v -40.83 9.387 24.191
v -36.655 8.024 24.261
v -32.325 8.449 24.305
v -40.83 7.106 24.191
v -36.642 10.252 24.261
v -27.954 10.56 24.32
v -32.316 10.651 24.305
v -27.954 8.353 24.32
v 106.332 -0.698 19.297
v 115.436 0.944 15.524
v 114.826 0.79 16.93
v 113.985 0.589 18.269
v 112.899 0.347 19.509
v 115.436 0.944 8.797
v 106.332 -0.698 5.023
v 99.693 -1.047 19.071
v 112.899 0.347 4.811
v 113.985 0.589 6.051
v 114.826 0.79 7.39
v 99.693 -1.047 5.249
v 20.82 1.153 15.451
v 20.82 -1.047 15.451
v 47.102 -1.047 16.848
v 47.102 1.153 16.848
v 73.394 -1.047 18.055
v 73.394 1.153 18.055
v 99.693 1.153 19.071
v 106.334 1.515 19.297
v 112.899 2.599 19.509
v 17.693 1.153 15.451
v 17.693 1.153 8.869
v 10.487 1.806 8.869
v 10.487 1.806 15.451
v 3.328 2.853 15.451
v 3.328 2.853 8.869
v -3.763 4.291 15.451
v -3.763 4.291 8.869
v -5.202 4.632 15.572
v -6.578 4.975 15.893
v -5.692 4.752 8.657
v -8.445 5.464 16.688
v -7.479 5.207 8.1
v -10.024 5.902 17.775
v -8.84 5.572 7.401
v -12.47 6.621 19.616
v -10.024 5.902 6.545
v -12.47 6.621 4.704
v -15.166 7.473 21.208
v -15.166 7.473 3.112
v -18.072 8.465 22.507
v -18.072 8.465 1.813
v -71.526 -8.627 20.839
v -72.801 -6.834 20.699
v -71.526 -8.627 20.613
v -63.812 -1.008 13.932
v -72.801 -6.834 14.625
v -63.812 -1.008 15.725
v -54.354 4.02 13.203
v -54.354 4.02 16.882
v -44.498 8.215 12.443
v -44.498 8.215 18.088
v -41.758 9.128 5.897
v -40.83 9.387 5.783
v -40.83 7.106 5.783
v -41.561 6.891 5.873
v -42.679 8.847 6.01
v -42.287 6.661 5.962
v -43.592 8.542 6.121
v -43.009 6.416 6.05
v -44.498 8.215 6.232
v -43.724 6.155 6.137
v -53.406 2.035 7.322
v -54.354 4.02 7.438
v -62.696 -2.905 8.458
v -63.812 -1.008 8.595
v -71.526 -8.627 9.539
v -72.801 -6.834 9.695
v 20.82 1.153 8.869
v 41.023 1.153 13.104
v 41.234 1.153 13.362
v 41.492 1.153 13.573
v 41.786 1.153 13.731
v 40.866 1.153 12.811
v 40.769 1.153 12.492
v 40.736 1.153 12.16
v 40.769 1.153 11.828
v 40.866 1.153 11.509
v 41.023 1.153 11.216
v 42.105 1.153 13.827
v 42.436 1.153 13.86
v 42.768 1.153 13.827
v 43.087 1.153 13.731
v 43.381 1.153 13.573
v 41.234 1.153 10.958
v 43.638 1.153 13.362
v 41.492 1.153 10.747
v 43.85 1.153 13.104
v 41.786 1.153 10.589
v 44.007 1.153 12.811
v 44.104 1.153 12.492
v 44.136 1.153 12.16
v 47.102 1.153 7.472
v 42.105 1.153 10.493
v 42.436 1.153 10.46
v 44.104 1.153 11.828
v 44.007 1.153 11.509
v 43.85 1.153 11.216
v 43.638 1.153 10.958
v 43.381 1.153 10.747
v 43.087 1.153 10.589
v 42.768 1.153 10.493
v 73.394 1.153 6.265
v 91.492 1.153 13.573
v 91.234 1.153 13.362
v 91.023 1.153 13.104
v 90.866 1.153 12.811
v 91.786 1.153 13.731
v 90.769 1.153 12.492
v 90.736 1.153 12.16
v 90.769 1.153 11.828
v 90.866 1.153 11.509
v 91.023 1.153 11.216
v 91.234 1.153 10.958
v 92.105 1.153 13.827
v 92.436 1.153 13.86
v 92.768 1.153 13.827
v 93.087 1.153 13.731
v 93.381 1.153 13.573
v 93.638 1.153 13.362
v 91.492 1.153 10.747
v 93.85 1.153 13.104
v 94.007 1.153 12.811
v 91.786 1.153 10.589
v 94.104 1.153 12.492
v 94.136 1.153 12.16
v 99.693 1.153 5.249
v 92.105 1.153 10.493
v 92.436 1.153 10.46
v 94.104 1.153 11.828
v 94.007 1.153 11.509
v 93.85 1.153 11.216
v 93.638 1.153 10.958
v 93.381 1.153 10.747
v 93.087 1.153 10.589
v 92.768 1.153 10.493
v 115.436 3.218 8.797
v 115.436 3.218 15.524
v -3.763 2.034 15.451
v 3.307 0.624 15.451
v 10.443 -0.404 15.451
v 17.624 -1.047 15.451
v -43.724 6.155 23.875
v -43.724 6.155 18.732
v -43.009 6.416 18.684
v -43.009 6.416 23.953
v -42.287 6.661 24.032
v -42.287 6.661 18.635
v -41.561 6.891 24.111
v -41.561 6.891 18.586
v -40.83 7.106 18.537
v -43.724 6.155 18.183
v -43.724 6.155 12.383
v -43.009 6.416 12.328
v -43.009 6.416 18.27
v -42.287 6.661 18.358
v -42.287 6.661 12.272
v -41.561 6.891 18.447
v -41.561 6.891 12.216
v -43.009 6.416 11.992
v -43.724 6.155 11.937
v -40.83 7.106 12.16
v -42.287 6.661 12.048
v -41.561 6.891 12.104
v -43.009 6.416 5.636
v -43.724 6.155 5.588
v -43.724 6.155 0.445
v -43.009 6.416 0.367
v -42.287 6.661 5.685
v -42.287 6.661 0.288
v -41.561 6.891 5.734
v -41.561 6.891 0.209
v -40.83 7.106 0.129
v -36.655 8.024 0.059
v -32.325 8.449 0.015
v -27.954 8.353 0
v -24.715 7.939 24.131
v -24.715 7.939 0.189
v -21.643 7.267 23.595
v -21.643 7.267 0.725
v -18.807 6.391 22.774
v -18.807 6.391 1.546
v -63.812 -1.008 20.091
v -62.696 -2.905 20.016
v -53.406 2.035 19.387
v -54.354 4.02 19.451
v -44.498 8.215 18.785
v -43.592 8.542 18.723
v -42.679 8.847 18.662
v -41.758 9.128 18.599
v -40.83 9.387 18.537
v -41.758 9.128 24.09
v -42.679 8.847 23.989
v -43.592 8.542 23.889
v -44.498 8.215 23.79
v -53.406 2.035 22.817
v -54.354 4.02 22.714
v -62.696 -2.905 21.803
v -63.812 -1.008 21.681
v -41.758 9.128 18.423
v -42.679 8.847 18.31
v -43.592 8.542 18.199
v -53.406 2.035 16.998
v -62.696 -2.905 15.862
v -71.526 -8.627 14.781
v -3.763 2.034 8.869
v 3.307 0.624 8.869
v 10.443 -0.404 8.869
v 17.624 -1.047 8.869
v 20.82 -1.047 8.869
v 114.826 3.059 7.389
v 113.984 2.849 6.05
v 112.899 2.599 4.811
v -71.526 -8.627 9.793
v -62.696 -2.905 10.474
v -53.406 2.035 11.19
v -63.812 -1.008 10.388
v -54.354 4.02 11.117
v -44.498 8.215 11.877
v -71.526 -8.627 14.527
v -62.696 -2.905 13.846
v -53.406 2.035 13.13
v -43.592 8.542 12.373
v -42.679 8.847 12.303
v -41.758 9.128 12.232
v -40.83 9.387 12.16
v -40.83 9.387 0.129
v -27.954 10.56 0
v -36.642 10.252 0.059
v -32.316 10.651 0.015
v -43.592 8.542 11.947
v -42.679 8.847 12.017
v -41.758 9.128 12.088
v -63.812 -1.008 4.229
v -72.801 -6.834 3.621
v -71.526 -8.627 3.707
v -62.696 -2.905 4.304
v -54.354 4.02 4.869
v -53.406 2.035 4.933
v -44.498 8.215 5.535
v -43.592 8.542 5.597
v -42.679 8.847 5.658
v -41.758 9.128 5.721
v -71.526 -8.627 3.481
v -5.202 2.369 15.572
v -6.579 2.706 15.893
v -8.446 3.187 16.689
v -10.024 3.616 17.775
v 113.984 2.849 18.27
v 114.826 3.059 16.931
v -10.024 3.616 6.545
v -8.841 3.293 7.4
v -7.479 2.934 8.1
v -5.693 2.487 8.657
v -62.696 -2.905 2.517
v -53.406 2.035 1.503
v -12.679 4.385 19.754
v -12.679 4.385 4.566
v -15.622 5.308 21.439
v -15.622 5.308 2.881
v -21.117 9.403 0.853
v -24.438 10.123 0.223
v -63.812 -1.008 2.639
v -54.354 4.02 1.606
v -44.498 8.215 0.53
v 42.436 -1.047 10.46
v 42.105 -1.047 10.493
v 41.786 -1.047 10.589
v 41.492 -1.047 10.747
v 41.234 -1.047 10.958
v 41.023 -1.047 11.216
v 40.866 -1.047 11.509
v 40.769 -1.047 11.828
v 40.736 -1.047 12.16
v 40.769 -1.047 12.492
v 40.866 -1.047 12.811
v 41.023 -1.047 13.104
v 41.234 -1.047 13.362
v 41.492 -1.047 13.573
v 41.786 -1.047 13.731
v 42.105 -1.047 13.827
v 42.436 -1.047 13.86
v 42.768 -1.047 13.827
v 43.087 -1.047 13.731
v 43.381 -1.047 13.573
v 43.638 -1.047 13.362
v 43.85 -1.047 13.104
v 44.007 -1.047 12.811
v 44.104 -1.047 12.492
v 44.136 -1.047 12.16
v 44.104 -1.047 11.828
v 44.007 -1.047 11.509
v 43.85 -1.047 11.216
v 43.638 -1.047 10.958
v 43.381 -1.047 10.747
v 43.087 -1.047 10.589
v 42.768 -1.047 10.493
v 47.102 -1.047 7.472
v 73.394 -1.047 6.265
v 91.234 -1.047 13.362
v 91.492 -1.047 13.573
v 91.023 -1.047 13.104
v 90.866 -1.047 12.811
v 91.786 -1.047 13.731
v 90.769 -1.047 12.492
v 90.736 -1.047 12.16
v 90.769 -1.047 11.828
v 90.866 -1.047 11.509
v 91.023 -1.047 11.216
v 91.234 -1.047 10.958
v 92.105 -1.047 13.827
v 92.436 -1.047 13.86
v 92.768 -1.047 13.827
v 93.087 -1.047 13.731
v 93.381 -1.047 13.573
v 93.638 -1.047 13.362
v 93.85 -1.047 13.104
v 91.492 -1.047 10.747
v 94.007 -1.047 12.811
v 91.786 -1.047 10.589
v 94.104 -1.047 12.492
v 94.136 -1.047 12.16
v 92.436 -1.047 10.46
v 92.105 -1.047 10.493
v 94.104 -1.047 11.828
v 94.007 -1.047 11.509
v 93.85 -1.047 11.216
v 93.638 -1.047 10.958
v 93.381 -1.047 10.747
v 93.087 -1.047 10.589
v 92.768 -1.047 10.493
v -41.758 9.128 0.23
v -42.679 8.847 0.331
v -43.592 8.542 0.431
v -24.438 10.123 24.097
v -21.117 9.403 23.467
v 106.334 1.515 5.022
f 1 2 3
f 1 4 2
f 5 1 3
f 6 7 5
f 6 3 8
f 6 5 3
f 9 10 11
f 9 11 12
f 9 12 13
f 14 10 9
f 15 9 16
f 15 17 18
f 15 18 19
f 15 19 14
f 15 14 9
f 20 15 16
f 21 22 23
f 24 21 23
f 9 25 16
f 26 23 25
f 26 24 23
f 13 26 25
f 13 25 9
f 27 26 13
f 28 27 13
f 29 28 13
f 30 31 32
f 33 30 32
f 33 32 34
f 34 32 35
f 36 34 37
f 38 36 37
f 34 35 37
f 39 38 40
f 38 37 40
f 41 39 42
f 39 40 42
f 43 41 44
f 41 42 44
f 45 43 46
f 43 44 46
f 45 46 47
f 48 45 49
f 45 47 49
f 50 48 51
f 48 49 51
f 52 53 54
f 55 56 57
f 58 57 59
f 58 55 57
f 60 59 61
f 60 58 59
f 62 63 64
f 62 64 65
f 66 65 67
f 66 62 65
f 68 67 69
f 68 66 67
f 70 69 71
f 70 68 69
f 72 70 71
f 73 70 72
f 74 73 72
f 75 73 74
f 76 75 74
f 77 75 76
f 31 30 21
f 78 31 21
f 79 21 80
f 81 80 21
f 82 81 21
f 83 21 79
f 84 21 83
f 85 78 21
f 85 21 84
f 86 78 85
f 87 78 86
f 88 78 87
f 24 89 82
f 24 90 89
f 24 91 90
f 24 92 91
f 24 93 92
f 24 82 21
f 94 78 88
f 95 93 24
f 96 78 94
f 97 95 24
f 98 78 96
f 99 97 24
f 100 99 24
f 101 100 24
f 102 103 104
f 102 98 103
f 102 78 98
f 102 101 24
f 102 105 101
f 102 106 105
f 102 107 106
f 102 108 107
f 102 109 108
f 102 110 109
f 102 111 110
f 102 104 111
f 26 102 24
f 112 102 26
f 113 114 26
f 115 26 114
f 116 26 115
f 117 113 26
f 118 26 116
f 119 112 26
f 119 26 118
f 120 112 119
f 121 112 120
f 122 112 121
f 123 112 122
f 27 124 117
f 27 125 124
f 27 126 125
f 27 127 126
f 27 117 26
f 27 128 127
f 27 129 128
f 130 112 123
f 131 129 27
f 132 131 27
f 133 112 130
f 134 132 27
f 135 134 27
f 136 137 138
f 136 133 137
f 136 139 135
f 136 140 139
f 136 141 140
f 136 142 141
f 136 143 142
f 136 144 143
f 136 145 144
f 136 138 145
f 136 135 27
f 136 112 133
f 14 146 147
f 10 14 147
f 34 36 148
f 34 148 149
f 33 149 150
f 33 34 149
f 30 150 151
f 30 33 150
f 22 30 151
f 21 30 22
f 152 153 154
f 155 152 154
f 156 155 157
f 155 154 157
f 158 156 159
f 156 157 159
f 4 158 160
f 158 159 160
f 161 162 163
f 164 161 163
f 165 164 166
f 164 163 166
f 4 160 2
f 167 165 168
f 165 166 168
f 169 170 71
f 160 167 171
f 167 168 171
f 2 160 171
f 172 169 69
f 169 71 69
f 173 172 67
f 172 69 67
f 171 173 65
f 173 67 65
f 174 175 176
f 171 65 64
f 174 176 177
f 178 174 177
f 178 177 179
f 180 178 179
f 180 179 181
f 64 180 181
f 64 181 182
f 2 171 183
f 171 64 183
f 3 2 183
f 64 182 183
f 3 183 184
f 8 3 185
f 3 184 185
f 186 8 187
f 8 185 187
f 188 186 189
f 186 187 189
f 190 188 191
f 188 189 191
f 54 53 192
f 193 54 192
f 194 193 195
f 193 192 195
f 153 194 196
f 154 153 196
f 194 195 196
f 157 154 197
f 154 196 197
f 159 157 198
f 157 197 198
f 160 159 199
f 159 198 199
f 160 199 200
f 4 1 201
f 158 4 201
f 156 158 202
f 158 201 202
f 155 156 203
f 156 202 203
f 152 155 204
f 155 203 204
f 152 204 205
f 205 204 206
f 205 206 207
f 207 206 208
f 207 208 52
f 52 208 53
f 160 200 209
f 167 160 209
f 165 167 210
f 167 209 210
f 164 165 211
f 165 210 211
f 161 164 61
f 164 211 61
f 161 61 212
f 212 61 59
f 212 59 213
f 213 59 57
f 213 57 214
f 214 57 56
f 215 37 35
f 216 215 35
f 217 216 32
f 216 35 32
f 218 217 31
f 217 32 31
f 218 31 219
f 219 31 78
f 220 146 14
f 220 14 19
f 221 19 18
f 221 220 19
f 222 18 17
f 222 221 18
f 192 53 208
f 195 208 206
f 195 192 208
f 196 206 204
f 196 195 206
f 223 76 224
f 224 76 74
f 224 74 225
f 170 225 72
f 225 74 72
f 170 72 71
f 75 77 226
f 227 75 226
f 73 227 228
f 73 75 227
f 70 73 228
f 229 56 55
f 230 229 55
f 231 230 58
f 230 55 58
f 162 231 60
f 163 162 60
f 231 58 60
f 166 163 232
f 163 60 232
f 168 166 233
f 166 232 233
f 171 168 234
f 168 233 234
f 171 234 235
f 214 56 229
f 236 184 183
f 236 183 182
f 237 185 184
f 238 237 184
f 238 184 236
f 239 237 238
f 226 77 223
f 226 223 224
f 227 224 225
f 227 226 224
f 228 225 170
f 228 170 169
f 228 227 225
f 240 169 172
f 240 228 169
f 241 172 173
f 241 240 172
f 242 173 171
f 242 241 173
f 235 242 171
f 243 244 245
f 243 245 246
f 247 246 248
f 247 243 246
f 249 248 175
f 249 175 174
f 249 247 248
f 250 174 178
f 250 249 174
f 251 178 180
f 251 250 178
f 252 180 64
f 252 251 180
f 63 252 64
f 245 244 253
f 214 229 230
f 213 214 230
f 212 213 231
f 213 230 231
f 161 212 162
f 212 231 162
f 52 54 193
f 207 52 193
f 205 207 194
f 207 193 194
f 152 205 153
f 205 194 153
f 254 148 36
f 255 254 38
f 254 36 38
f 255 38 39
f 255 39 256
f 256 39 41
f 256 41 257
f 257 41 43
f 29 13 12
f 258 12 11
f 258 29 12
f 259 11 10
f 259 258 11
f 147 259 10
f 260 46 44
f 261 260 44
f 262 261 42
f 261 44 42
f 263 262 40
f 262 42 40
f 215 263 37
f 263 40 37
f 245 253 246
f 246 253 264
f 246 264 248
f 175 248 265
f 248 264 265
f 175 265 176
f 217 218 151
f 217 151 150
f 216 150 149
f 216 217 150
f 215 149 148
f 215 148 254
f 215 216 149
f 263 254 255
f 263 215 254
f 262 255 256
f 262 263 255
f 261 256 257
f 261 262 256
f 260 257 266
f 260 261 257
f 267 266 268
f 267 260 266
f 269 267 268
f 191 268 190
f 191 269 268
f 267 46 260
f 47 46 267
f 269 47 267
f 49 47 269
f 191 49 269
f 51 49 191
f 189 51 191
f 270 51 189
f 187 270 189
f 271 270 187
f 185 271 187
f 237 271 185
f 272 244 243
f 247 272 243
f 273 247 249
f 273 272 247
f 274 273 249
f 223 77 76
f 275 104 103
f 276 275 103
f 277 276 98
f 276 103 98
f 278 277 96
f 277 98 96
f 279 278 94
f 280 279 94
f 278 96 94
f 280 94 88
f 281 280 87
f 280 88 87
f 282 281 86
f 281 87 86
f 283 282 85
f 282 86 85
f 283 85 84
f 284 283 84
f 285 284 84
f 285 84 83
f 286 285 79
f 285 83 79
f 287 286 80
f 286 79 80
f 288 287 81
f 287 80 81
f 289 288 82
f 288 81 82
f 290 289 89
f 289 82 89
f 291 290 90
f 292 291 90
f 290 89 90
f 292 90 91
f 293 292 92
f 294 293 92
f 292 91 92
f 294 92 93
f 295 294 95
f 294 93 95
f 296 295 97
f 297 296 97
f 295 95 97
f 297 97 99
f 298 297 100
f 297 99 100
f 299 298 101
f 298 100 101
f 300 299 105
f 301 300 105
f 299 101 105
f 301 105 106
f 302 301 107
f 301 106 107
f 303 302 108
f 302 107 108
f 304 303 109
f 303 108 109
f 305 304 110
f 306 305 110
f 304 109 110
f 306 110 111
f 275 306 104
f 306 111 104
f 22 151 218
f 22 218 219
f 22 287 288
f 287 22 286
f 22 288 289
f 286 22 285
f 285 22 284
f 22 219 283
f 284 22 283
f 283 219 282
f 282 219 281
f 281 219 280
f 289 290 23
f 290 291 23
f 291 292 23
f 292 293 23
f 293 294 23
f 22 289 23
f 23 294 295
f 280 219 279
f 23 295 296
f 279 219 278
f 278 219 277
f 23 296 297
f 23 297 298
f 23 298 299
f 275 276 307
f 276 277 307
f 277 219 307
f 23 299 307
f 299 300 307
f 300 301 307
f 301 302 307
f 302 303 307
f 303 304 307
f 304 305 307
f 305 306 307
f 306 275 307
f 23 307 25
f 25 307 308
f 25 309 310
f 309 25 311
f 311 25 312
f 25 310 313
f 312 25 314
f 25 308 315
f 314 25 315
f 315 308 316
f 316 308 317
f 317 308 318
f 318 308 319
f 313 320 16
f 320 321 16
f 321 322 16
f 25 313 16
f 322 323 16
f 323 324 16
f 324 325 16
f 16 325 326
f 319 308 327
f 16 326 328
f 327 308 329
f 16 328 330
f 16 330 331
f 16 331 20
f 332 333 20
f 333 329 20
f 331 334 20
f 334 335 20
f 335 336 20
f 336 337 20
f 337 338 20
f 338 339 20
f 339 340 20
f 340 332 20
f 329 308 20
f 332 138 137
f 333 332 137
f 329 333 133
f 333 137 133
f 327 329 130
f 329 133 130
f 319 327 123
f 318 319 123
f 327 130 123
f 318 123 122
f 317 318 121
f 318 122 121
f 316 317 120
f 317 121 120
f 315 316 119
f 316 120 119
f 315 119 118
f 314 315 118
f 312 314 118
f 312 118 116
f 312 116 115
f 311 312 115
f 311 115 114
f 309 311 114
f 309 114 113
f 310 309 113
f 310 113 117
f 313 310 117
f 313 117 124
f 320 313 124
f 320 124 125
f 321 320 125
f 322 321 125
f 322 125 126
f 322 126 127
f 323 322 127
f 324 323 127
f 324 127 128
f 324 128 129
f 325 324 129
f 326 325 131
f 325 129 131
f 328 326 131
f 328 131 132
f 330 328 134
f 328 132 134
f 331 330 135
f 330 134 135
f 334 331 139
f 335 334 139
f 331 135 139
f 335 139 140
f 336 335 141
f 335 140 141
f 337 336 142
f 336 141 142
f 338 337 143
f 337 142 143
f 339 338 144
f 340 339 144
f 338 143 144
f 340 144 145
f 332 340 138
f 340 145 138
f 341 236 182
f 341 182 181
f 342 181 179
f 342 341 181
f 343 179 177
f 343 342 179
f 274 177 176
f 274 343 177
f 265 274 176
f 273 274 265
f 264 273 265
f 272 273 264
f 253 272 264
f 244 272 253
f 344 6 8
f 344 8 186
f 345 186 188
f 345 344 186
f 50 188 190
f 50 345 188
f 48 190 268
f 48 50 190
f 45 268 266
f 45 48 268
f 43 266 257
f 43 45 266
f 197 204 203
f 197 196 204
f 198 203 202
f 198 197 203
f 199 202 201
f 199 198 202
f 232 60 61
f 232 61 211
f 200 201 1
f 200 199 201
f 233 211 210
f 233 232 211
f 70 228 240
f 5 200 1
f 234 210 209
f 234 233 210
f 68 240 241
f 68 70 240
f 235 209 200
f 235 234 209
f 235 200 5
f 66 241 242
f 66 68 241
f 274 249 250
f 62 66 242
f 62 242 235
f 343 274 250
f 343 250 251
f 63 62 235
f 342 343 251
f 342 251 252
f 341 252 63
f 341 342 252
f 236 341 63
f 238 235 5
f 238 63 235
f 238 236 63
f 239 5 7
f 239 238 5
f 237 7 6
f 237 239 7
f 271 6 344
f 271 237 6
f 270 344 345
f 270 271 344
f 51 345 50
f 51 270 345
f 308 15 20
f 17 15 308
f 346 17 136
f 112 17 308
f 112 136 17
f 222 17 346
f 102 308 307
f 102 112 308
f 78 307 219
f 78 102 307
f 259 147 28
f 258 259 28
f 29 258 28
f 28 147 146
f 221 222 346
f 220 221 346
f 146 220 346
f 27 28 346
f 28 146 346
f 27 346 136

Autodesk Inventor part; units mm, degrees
ref_plane "YZ Plane" through (0, 0, 0) normal (1, 0, 0) x (0, 1, 0)
ref_plane "XZ Plane" through (0, 0, 0) normal (0, 1, 0) x (-1, 0, 0)
ref_plane "XY Plane" through (0, 0, 0) normal (0, 0, 1) x (1, 0, 0)
sketch "スケッチ2" plane through (0, 0, 0) normal (0, 0, 1) x (1, 0, 0)
  arc A0 (-18.0723, 8.4646) -> (-44.4977, 8.2149) centre (-30.9427, -27.8877) ccw
  arc A1 (-18.0723, 8.4646) -> (17.6933, 1.1527) centre (26.0163, 132.9927) ccw
  arc A2 (99.6933, 1.1527) -> (115.4364, 3.2181) centre (99.6933, 62.1838) ccw
  arc A3 (-44.4977, 8.2149) -> (-72.801, -6.8342) centre (-0.878, -107.9623) ccw
  line L0 (17.6933, 1.1527) -> (99.6933, 1.1527)
  arc A4 (-43.7244, 6.1553) -> (-71.526, -8.627) centre (-0.878, -107.9623) ccw
  arc A5 (-18.8066, 6.3908) -> (-43.7244, 6.1553) centre (-30.9427, -27.8877) ccw
  arc A6 (-18.8066, 6.3908) -> (17.6242, -1.0473) centre (26.0163, 132.9927) ccw
  line L1 (17.6242, -1.0473) -> (99.6933, -1.0473)
  arc A7 (99.6933, -1.0473) -> (116.0039, 1.0926) centre (99.6933, 62.1838) ccw
  line L2 (-72.801, -6.8342) -> (-71.526, -8.627)
  line L3 (115.4364, 3.2181) -> (116.0039, 1.0926)
  point P0 (0, 0)
  dimension "d19" = 82
  dimension "d26" = 132.1025
  dimension "d27" = 38.5634
  dimension "d28" = 124.096
  dimension "d29" = 14.842
  dimension "d30" = 40.075
  dimension "d31" = 15.884
  dimension "d32" = 14.949
  dimension "d33" = 61.0311
  dimension "d34" = 2.2
extrude "押し出し2" add sketch "スケッチ2" along normal blind 24.32
sketch "スケッチ3" plane through (17.6242, -1.0473, 0) normal (0, -1, 0) x (1, 0, 0)
  line L0 (98.3797, 0) -> (98.3797, 24.32) projected
  arc A0 (-45.5784, 24.32) -> (-58.4546, 24.1908) centre (-45.5784, -617.2518) ccw
  line L1 (-61.3487, 24.32) -> (-36.4308, 24.32) projected
  arc A1 (-27.6481, 17.7751) -> (-45.5784, 24.32) centre (-45.5784, -3.5132) ccw
  arc A2 (-27.6481, 17.7751) -> (-21.3876, 15.4513) centre (-21.2803, 25.3354) ccw
  arc A3 (95.2752, 19.5094) -> (3.1956, 15.4513) centre (209.2083, -3612.3091) ccw
  line L2 (97.8122, 0) -> (97.8122, 24.32) projected
  arc A4 (98.3797, 12.16) -> (95.2752, 19.5094) centre (88.128, 12.16) ccw
  line L3 (-21.3876, 15.4513) -> (3.1956, 15.4513)
  line L4 (-90.4253, 0) -> (-90.4253, 24.32) projected
  line L5 (-58.4546, 24.1908) -> (-90.4253, 20.6993)
  line L6 (-90.4253, 20.6993) -> (-58.4546, 18.5366)
  line L7 (-58.4546, 18.5366) -> (-90.4253, 14.6253)
  line L8 (-90.4253, 14.6253) -> (-58.4546, 12.16)
  line L9 (-58.4546, 12.16) -> (98.3797, 12.16)
  arc A5 (-58.4546, 0.1292) -> (-45.5784, 0) centre (-45.5784, 641.5718) ccw
  arc A6 (-45.5784, 0) -> (-27.6481, 6.5449) centre (-45.5784, 27.8332) ccw
  arc A7 (-21.3876, 8.8687) -> (-27.6481, 6.5449) centre (-21.2803, -1.0154) ccw
  arc A8 (3.1956, 8.8687) -> (95.2752, 4.8106) centre (209.2083, 3636.6291) ccw
  arc A9 (95.2752, 4.8106) -> (98.3797, 12.16) centre (88.128, 12.16) ccw
  line L10 (-21.3876, 8.8687) -> (3.1956, 8.8687)
  line L11 (-58.4546, 0.1292) -> (-90.4253, 3.6207)
  line L12 (-90.4253, 3.6207) -> (-58.4546, 5.7834)
  line L13 (-58.4546, 5.7834) -> (-90.4253, 9.6947)
  line L14 (-90.4253, 9.6947) -> (-58.4546, 12.16)
  point P0 (97.8122, 12.16)
  point P1 (97.8122, 8.7964)
  point P2 (97.8122, 15.5236)
extrude "押し出し3" cut sketch "スケッチ3" along normal mid plane 24.32 contours A1 A2 L3 A3 A4 L2 L9 L8 L7 L6 L5 A0 | L14 L9 L2 A9 A8 L10 A7 A6 A5 L11 L12 L13 keep common part
sketch "スケッチ4" plane through (17.6242, -1.0473, 8.8687) normal (0, -1, 0) x (1, 0, 0)
  line L0 (97.8122, 6.6548) -> (97.8122, -0.0723) projected
  point P0 (-17.6242, -8.8687)
  point P1 (74.8122, 3.2913)
  point P2 (97.8122, 3.2913)
  point P3 (24.8122, 3.2913)
  dimension "d39" = 23
  dimension "d47" = 50
hole "穴1" at (92.4364, -1.0473, 12.16) at (42.4364, -1.0473, 12.16) direction (0, 1, 0) diameter 3.4 end through all clearance for "Countersunk Flat Head Screw ISO 2009/7046" size "M3" standard "ISO"
properties part number "fork" material "ポリスチレン"
